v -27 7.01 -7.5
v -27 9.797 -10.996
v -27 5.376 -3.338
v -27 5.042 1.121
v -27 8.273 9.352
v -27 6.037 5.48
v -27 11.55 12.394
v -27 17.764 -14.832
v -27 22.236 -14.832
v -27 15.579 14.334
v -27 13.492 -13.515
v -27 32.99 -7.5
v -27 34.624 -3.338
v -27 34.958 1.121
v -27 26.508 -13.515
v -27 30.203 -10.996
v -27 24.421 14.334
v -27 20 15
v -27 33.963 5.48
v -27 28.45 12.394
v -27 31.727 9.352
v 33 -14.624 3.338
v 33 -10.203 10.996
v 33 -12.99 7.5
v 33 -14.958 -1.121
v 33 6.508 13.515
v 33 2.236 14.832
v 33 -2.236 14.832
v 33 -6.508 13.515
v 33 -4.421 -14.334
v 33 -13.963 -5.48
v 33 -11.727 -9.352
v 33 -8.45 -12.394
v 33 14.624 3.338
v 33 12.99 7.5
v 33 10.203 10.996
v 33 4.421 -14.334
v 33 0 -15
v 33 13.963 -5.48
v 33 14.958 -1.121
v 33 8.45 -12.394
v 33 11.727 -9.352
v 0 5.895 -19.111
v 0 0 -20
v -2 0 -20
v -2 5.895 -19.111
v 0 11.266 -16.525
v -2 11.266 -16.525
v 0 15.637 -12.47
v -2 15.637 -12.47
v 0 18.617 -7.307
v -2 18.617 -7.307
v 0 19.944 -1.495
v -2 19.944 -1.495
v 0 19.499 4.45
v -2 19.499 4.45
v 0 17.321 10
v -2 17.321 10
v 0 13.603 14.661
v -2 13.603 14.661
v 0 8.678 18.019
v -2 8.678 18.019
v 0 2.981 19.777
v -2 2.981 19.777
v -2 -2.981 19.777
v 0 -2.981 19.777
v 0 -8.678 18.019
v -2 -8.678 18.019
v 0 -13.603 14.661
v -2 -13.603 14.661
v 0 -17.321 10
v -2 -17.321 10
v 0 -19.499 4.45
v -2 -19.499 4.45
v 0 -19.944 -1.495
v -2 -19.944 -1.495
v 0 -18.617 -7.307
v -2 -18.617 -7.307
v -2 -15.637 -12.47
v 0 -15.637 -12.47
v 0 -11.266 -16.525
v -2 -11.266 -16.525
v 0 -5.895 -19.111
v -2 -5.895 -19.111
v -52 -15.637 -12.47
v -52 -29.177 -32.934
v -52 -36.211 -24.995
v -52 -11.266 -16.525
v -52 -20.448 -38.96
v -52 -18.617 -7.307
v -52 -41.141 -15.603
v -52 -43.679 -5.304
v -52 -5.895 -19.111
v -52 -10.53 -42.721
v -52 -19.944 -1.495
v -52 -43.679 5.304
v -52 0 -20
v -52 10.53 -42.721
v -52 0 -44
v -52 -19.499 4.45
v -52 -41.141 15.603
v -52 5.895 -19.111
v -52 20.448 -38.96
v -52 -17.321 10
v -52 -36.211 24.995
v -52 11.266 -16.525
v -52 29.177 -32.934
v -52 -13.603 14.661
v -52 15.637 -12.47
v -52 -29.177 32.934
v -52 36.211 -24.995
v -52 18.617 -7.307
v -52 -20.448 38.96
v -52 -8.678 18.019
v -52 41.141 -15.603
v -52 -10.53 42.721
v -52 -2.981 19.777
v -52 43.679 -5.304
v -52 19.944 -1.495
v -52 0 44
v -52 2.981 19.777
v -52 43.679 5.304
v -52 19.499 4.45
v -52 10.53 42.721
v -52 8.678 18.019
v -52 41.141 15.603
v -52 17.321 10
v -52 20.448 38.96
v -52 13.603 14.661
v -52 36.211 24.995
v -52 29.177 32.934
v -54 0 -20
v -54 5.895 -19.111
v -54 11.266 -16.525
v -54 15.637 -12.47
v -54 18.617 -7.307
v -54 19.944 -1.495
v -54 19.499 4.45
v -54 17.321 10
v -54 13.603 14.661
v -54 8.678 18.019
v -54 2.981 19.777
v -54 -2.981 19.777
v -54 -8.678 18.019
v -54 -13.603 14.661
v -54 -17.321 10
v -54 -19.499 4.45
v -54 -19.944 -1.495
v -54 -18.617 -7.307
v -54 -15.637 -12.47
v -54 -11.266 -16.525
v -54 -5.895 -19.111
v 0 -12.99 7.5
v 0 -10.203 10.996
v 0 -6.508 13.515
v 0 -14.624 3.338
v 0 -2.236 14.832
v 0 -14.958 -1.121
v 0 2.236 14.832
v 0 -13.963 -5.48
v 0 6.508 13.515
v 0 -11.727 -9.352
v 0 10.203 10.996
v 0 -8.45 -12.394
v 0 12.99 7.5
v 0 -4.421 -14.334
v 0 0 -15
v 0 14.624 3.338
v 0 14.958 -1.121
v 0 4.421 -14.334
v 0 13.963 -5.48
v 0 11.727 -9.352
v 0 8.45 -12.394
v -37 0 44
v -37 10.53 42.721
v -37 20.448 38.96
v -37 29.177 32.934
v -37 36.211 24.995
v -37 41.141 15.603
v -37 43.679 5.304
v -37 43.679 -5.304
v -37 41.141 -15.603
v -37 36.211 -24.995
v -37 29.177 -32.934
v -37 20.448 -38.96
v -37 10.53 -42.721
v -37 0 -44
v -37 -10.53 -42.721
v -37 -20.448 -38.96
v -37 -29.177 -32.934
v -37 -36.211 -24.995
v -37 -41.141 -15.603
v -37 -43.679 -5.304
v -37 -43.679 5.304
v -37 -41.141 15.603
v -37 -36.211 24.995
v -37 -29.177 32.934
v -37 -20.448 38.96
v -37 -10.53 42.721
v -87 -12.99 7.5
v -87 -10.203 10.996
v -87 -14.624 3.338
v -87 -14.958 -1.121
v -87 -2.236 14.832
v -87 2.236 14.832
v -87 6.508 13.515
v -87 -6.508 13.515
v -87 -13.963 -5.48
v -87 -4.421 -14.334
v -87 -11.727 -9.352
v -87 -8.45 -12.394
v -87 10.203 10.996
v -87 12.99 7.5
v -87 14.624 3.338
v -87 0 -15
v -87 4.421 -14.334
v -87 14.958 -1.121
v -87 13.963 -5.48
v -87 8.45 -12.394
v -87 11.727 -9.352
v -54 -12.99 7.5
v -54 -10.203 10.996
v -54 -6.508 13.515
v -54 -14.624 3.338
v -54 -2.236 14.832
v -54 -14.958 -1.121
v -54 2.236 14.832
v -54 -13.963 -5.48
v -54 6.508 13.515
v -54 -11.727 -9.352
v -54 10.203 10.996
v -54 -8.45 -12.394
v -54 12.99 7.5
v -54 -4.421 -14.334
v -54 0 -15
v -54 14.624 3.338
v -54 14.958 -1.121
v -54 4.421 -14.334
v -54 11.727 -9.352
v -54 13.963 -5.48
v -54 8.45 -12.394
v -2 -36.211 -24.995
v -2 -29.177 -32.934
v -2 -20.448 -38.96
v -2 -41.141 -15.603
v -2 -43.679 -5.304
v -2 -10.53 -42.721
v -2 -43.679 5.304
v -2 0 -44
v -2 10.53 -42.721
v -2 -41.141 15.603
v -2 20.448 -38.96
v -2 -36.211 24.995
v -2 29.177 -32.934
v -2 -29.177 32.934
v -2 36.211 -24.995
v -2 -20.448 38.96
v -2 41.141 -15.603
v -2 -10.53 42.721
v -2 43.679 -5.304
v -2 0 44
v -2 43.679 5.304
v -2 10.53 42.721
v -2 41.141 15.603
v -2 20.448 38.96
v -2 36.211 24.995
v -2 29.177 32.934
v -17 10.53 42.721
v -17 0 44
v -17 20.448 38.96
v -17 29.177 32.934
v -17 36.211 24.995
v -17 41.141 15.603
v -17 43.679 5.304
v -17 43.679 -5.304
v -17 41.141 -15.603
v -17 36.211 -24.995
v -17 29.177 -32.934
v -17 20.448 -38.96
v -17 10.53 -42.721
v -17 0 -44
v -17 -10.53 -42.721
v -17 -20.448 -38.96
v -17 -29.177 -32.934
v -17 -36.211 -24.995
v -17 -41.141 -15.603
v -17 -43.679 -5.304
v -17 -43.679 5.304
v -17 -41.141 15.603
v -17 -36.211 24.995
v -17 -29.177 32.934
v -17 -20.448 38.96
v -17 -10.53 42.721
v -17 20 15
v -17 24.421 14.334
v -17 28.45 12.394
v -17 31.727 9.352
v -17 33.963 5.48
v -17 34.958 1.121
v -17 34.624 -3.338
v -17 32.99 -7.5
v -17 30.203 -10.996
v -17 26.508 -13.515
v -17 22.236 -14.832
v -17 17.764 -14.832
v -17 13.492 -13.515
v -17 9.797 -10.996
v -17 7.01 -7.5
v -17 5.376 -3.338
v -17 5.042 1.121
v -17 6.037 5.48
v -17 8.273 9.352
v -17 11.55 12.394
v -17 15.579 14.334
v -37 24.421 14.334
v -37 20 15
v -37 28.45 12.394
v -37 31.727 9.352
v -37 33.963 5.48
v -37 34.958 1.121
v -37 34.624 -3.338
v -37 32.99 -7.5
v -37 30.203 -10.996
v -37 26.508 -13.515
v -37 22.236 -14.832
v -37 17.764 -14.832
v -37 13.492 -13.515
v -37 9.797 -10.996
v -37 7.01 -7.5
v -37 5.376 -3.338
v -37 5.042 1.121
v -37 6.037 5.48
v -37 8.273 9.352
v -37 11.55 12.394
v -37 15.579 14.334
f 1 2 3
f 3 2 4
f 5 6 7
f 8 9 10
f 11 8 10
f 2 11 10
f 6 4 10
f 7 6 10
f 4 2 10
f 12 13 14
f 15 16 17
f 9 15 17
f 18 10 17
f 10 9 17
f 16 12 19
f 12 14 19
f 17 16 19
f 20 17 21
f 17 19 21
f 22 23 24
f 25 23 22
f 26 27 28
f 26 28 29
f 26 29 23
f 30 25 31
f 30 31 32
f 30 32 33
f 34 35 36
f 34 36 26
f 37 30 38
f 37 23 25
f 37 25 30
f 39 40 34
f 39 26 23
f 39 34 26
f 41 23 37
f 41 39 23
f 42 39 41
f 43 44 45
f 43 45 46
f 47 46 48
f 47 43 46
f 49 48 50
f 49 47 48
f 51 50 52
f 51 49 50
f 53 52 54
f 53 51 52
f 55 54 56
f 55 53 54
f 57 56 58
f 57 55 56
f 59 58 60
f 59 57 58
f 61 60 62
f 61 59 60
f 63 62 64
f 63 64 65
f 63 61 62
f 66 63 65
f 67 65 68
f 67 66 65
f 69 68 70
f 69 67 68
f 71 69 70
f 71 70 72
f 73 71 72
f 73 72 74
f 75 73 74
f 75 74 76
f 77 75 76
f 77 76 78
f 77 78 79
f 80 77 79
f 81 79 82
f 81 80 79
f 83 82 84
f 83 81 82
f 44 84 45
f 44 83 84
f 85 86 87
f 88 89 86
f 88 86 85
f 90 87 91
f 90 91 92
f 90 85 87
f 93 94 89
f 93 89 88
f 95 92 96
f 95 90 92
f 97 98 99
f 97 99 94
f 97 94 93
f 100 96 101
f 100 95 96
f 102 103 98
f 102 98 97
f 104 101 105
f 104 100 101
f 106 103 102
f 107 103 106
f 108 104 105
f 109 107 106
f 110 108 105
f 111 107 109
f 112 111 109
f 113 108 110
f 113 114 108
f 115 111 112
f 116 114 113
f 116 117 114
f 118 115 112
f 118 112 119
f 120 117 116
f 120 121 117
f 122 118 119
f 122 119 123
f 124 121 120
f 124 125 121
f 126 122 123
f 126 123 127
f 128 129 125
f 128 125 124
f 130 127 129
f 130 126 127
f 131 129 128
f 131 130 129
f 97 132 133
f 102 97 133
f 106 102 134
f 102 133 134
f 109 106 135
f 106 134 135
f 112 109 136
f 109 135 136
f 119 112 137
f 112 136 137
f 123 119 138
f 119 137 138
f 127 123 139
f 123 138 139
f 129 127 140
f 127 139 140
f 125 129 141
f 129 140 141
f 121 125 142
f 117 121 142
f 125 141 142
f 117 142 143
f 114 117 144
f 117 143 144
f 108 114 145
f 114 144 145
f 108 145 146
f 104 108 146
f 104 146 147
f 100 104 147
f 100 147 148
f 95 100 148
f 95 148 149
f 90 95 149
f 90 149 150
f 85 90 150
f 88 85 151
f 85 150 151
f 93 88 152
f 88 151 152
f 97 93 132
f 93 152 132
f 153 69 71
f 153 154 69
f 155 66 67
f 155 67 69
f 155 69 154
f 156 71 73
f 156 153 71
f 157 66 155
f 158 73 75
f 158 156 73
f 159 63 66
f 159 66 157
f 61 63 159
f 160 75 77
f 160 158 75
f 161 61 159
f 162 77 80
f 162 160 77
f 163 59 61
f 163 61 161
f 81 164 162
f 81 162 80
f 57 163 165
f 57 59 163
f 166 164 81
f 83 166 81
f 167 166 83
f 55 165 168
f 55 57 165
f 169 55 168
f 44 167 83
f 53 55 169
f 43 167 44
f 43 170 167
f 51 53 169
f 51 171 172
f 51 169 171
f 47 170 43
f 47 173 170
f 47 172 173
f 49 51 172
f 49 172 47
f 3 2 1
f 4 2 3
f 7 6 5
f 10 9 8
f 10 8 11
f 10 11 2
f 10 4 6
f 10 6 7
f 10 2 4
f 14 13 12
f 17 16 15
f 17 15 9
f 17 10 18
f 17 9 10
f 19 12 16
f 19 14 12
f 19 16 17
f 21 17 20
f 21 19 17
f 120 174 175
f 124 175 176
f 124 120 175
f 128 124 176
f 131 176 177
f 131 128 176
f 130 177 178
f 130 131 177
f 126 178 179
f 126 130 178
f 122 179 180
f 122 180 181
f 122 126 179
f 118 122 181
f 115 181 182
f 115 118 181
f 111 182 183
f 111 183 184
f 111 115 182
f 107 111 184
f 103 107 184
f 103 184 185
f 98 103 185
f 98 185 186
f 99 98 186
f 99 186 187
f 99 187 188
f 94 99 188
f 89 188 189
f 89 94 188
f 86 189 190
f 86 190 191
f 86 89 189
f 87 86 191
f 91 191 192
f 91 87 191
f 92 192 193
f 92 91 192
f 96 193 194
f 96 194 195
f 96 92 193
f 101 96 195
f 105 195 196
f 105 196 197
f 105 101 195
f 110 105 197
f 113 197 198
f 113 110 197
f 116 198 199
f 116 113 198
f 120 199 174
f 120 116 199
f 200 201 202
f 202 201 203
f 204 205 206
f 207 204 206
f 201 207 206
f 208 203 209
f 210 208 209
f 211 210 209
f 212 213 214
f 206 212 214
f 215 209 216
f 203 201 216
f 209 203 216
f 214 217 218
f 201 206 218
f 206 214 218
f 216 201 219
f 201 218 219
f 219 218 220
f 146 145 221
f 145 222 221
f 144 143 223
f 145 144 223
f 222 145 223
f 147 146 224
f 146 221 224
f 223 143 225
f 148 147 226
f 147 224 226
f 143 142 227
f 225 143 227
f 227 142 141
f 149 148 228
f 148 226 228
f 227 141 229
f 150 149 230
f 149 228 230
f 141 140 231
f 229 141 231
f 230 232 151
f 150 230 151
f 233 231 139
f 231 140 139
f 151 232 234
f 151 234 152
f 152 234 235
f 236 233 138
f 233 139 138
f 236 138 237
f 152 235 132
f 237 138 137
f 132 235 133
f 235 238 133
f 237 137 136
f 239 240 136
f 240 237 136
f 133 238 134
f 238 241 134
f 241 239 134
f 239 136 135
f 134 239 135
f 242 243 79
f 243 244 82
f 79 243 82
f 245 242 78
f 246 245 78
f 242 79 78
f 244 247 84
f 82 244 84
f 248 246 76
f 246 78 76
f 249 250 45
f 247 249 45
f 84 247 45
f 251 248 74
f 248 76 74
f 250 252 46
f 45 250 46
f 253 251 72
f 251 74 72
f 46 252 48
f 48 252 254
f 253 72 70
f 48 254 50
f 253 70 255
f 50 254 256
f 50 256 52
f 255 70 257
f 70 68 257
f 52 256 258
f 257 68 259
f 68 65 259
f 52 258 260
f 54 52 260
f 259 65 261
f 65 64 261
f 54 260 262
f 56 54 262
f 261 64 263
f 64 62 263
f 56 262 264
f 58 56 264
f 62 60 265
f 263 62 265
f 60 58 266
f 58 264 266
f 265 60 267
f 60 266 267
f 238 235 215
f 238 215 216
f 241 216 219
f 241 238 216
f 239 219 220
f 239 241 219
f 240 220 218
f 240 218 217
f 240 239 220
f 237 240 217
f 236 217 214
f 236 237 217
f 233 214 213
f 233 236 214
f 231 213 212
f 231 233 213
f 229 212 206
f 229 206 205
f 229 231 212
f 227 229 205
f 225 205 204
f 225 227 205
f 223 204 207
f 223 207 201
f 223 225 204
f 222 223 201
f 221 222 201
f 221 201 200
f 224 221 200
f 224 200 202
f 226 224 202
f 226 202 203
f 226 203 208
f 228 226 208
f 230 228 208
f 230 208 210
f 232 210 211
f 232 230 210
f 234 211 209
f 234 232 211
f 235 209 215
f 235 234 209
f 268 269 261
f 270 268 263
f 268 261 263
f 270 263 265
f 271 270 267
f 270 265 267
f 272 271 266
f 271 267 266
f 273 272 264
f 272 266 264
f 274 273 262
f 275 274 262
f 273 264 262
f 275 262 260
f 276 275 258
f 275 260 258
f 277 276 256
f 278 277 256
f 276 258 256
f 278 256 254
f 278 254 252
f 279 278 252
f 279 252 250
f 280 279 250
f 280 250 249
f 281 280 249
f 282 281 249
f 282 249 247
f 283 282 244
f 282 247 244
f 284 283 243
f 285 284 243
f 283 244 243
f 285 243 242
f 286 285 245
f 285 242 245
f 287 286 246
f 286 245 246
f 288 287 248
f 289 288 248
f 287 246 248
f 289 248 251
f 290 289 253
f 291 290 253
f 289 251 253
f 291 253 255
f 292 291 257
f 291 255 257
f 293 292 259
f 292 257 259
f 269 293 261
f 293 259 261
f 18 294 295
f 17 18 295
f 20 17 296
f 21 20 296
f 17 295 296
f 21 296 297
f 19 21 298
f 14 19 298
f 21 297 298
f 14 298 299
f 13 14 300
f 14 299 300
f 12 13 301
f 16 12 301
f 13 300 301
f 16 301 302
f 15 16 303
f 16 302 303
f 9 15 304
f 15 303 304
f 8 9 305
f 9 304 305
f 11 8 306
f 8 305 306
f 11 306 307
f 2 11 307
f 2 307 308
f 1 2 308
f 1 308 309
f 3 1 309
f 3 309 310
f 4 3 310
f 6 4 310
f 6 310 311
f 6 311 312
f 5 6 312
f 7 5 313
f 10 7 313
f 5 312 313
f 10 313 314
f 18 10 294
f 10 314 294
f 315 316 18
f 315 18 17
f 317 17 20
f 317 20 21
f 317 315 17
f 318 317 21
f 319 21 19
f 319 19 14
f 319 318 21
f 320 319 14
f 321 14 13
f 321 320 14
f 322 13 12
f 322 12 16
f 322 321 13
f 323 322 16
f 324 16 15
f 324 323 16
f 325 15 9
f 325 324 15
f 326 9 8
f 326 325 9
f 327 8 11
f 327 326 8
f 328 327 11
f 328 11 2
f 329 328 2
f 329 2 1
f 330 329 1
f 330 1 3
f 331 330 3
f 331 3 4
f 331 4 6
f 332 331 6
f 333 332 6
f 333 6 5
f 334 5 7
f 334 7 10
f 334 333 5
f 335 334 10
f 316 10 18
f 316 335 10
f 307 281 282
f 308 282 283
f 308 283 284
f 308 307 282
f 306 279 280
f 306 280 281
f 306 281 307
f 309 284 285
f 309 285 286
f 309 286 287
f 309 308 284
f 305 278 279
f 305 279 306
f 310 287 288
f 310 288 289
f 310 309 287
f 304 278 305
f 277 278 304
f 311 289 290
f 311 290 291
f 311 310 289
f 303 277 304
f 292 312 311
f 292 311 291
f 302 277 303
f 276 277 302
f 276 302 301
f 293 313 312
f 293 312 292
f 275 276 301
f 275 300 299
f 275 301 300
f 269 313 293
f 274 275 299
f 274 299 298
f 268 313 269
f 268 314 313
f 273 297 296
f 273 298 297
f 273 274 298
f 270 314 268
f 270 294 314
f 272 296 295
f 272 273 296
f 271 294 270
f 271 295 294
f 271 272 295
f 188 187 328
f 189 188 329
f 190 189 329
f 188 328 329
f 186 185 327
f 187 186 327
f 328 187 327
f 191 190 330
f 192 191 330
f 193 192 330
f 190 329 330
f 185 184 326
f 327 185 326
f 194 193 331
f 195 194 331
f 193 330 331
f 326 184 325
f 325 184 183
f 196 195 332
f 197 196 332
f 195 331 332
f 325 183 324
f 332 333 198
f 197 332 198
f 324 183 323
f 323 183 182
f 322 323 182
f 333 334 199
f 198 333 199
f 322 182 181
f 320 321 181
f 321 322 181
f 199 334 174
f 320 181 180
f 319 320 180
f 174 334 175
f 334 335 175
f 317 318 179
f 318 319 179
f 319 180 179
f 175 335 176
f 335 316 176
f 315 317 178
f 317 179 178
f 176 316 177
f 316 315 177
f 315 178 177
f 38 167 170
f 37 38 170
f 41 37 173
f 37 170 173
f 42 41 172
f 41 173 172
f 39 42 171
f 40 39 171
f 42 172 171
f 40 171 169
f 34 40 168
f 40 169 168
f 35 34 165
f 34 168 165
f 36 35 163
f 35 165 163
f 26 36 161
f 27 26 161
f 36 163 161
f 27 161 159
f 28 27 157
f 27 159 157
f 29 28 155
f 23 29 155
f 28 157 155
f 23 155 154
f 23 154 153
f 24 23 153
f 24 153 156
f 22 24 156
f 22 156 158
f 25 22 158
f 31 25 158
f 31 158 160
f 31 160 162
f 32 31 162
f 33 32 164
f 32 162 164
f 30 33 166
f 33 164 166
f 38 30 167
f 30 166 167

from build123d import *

# Parameters (mm, degrees)
SZKIC1_R                    = 15
DODANIE_WYCI_GNI_CIE1_DEPTH = 33
SZKIC4_R                    = 20
DODANIE_WYCI_GNI_CIE2_DEPTH = 2
SZKIC6_R                    = 44
DODANIE_WYCI_GNI_CIE4_DEPTH = 15
SZKIC7_R                    = 15
DODANIE_WYCI_GNI_CIE5_DEPTH = 10


with BuildPart() as part:
    # Szkic1 → Dodanie-wyciągnięcie1 (new body)
    with BuildSketch(Plane(origin=(0, 0, 0), x_dir=(0, 0, -1), z_dir=(1, 0, 0))):
        Circle(SZKIC1_R)
    extrude(amount=DODANIE_WYCI_GNI_CIE1_DEPTH)

    # Szkic4 → Dodanie-wyciągnięcie2 (add)
    with BuildSketch(Plane(origin=(0, 0, 0), x_dir=(0, 0, -1), z_dir=(1, 0, 0))):
        Circle(SZKIC4_R)
    extrude(amount=-DODANIE_WYCI_GNI_CIE2_DEPTH)

    # Szkic6 → Dodanie-wyciągnięcie4 (add)
    with BuildSketch(Plane.ZY.offset(2)):
        Circle(SZKIC6_R)
    extrude(amount=DODANIE_WYCI_GNI_CIE4_DEPTH)

    # Szkic7 → Dodanie-wyciągnięcie5 (add)
    with BuildSketch(Plane.ZY.offset(17)):
        with Locations((0, 20)):
            Circle(SZKIC7_R)
    extrude(amount=DODANIE_WYCI_GNI_CIE5_DEPTH)


with BuildPart() as body_2:
    # Lustro1: mirrored copy
    add(part.part.mirror(Plane(origin=(-27, 20, 0), x_dir=(0, 0, 1), z_dir=(-1, 0, 0))))


solid = Compound([part.part, body_2.part])
